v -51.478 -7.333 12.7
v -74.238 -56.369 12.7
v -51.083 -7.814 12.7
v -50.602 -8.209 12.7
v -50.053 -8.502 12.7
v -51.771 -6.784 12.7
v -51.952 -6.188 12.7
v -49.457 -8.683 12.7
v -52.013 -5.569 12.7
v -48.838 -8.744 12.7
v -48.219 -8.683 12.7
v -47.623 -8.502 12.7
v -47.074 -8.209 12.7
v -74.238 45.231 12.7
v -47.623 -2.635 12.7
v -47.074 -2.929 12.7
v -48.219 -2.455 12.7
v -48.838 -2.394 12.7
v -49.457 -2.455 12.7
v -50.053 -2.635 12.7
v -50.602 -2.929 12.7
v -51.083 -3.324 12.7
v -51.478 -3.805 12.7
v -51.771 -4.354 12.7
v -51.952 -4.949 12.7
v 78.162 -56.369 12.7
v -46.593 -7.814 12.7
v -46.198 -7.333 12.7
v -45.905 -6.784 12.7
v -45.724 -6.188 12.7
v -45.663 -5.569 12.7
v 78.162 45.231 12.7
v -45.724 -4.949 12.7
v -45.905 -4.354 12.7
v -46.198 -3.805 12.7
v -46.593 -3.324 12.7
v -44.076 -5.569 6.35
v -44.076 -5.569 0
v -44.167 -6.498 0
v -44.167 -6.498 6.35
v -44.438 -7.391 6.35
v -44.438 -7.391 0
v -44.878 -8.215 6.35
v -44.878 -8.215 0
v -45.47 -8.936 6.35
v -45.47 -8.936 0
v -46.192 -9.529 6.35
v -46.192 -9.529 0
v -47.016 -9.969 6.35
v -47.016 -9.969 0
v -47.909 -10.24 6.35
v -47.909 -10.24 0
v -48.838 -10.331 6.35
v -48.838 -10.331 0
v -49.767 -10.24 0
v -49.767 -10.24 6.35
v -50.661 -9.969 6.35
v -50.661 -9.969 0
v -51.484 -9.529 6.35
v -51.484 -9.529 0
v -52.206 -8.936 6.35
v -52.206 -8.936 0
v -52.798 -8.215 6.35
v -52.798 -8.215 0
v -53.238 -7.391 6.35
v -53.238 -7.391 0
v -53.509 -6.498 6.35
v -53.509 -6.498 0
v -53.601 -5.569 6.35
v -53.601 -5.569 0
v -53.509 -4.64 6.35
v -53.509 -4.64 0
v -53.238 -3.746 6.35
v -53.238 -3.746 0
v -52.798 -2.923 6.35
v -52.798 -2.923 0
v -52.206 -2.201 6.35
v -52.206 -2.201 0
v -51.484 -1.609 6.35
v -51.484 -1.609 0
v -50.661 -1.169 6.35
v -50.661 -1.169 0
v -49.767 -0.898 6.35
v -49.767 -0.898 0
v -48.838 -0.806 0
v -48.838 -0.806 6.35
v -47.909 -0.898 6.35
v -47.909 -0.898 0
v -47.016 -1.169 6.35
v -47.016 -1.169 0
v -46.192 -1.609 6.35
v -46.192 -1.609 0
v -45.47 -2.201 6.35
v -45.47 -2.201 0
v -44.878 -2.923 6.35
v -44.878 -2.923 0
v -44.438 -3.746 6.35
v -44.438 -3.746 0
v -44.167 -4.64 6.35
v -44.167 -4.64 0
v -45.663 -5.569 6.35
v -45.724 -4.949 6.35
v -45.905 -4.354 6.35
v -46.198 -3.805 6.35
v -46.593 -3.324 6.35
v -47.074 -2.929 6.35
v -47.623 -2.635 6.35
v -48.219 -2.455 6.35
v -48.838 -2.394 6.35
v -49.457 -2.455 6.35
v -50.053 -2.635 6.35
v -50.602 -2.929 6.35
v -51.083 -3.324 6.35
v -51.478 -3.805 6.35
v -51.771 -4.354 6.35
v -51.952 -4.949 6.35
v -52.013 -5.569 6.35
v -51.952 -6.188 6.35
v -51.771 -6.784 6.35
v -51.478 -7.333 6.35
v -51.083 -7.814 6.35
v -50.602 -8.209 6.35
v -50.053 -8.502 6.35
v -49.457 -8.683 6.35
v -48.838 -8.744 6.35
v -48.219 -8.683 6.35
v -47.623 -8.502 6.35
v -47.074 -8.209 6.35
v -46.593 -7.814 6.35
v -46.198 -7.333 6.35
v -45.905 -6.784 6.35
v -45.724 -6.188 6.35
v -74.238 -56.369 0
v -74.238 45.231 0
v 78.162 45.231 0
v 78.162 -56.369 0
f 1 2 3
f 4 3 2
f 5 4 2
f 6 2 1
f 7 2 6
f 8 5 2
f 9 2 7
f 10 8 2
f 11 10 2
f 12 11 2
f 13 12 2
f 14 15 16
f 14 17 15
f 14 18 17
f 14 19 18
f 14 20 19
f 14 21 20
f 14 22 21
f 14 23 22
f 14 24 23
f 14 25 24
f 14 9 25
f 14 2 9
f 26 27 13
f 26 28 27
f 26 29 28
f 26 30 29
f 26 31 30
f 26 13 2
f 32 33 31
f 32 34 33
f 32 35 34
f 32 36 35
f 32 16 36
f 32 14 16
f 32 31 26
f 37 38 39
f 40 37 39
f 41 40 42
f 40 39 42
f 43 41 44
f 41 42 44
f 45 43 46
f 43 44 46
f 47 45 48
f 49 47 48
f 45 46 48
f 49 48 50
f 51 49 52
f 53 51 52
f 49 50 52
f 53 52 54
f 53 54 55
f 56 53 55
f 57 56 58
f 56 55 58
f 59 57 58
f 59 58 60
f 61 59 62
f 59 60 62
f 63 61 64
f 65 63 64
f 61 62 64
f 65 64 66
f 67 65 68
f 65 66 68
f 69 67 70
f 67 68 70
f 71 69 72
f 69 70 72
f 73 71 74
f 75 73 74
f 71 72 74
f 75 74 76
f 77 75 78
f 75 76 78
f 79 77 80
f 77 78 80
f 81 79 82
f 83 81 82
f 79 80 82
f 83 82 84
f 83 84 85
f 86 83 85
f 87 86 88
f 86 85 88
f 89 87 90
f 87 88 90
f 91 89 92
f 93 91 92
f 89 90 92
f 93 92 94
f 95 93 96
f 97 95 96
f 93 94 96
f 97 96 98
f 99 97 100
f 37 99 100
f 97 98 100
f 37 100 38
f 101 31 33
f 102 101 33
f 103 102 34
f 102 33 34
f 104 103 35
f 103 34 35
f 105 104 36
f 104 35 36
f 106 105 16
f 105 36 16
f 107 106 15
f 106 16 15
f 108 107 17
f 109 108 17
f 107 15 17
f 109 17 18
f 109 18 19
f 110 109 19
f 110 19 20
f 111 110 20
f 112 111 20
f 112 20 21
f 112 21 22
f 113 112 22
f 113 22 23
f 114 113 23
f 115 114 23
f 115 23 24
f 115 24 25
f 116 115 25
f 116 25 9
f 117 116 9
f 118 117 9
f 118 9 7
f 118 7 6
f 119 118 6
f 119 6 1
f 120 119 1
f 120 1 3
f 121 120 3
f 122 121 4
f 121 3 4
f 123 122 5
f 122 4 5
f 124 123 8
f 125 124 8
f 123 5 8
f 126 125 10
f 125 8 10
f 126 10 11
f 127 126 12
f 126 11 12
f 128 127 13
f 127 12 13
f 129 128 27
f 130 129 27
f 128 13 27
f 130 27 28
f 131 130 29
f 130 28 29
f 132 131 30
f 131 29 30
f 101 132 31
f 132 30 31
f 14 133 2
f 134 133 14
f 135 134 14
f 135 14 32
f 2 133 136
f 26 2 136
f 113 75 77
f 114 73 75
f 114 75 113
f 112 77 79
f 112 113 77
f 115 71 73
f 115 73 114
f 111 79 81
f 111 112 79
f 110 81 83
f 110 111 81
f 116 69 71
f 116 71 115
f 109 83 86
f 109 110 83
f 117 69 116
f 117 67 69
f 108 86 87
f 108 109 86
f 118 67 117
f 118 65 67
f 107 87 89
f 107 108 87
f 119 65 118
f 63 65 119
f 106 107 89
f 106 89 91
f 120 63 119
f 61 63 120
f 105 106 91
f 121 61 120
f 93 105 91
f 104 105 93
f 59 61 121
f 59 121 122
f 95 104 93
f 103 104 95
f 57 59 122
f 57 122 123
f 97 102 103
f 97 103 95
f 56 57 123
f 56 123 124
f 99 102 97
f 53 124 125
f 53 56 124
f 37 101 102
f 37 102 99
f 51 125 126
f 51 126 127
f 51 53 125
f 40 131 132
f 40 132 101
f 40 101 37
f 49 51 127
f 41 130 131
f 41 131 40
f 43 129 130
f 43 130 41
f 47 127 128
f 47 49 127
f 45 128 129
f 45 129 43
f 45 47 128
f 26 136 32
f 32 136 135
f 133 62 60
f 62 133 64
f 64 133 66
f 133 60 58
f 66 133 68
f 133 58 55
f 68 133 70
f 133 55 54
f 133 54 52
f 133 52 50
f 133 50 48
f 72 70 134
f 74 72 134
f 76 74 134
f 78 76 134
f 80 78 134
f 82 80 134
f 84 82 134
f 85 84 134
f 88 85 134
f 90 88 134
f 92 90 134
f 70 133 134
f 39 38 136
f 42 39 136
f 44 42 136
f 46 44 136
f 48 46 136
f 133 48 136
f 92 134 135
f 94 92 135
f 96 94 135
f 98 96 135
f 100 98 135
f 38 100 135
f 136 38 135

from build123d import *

# Parameters (mm, degrees)
F0_W     = 152.4
F0_H     = 101.6
F1_DEPTH = 12.7
F2_R     = 3.175
F3_DEPTH = 12.701
F4_R     = 4.7625
F5_DEPTH = 6.35


with BuildPart() as f1:
    # F0 (on Top) → F1 (new body)
    with BuildSketch(Plane.XY):
        with Locations((1.961969, -5.568703)):
            Rectangle(F0_W, F0_H)
    extrude(amount=F1_DEPTH)

    # F2 (on face) → F3 (cut, through all)
    with BuildSketch(Plane.XY.offset(12.7)):
        with Locations((-48.838031, -5.568703)):
            Circle(F2_R)
    extrude(amount=-F3_DEPTH, mode=Mode.SUBTRACT)

    # F4 (on face) → F5 (cut)
    with BuildSketch(Plane(origin=(0, 0, 0), x_dir=(1, 0, 0), z_dir=(0, 0, -1))):
        with Locations((-48.838031, 5.568703)):
            Circle(F4_R)
    extrude(amount=-F5_DEPTH, mode=Mode.SUBTRACT)


solid = f1.part
